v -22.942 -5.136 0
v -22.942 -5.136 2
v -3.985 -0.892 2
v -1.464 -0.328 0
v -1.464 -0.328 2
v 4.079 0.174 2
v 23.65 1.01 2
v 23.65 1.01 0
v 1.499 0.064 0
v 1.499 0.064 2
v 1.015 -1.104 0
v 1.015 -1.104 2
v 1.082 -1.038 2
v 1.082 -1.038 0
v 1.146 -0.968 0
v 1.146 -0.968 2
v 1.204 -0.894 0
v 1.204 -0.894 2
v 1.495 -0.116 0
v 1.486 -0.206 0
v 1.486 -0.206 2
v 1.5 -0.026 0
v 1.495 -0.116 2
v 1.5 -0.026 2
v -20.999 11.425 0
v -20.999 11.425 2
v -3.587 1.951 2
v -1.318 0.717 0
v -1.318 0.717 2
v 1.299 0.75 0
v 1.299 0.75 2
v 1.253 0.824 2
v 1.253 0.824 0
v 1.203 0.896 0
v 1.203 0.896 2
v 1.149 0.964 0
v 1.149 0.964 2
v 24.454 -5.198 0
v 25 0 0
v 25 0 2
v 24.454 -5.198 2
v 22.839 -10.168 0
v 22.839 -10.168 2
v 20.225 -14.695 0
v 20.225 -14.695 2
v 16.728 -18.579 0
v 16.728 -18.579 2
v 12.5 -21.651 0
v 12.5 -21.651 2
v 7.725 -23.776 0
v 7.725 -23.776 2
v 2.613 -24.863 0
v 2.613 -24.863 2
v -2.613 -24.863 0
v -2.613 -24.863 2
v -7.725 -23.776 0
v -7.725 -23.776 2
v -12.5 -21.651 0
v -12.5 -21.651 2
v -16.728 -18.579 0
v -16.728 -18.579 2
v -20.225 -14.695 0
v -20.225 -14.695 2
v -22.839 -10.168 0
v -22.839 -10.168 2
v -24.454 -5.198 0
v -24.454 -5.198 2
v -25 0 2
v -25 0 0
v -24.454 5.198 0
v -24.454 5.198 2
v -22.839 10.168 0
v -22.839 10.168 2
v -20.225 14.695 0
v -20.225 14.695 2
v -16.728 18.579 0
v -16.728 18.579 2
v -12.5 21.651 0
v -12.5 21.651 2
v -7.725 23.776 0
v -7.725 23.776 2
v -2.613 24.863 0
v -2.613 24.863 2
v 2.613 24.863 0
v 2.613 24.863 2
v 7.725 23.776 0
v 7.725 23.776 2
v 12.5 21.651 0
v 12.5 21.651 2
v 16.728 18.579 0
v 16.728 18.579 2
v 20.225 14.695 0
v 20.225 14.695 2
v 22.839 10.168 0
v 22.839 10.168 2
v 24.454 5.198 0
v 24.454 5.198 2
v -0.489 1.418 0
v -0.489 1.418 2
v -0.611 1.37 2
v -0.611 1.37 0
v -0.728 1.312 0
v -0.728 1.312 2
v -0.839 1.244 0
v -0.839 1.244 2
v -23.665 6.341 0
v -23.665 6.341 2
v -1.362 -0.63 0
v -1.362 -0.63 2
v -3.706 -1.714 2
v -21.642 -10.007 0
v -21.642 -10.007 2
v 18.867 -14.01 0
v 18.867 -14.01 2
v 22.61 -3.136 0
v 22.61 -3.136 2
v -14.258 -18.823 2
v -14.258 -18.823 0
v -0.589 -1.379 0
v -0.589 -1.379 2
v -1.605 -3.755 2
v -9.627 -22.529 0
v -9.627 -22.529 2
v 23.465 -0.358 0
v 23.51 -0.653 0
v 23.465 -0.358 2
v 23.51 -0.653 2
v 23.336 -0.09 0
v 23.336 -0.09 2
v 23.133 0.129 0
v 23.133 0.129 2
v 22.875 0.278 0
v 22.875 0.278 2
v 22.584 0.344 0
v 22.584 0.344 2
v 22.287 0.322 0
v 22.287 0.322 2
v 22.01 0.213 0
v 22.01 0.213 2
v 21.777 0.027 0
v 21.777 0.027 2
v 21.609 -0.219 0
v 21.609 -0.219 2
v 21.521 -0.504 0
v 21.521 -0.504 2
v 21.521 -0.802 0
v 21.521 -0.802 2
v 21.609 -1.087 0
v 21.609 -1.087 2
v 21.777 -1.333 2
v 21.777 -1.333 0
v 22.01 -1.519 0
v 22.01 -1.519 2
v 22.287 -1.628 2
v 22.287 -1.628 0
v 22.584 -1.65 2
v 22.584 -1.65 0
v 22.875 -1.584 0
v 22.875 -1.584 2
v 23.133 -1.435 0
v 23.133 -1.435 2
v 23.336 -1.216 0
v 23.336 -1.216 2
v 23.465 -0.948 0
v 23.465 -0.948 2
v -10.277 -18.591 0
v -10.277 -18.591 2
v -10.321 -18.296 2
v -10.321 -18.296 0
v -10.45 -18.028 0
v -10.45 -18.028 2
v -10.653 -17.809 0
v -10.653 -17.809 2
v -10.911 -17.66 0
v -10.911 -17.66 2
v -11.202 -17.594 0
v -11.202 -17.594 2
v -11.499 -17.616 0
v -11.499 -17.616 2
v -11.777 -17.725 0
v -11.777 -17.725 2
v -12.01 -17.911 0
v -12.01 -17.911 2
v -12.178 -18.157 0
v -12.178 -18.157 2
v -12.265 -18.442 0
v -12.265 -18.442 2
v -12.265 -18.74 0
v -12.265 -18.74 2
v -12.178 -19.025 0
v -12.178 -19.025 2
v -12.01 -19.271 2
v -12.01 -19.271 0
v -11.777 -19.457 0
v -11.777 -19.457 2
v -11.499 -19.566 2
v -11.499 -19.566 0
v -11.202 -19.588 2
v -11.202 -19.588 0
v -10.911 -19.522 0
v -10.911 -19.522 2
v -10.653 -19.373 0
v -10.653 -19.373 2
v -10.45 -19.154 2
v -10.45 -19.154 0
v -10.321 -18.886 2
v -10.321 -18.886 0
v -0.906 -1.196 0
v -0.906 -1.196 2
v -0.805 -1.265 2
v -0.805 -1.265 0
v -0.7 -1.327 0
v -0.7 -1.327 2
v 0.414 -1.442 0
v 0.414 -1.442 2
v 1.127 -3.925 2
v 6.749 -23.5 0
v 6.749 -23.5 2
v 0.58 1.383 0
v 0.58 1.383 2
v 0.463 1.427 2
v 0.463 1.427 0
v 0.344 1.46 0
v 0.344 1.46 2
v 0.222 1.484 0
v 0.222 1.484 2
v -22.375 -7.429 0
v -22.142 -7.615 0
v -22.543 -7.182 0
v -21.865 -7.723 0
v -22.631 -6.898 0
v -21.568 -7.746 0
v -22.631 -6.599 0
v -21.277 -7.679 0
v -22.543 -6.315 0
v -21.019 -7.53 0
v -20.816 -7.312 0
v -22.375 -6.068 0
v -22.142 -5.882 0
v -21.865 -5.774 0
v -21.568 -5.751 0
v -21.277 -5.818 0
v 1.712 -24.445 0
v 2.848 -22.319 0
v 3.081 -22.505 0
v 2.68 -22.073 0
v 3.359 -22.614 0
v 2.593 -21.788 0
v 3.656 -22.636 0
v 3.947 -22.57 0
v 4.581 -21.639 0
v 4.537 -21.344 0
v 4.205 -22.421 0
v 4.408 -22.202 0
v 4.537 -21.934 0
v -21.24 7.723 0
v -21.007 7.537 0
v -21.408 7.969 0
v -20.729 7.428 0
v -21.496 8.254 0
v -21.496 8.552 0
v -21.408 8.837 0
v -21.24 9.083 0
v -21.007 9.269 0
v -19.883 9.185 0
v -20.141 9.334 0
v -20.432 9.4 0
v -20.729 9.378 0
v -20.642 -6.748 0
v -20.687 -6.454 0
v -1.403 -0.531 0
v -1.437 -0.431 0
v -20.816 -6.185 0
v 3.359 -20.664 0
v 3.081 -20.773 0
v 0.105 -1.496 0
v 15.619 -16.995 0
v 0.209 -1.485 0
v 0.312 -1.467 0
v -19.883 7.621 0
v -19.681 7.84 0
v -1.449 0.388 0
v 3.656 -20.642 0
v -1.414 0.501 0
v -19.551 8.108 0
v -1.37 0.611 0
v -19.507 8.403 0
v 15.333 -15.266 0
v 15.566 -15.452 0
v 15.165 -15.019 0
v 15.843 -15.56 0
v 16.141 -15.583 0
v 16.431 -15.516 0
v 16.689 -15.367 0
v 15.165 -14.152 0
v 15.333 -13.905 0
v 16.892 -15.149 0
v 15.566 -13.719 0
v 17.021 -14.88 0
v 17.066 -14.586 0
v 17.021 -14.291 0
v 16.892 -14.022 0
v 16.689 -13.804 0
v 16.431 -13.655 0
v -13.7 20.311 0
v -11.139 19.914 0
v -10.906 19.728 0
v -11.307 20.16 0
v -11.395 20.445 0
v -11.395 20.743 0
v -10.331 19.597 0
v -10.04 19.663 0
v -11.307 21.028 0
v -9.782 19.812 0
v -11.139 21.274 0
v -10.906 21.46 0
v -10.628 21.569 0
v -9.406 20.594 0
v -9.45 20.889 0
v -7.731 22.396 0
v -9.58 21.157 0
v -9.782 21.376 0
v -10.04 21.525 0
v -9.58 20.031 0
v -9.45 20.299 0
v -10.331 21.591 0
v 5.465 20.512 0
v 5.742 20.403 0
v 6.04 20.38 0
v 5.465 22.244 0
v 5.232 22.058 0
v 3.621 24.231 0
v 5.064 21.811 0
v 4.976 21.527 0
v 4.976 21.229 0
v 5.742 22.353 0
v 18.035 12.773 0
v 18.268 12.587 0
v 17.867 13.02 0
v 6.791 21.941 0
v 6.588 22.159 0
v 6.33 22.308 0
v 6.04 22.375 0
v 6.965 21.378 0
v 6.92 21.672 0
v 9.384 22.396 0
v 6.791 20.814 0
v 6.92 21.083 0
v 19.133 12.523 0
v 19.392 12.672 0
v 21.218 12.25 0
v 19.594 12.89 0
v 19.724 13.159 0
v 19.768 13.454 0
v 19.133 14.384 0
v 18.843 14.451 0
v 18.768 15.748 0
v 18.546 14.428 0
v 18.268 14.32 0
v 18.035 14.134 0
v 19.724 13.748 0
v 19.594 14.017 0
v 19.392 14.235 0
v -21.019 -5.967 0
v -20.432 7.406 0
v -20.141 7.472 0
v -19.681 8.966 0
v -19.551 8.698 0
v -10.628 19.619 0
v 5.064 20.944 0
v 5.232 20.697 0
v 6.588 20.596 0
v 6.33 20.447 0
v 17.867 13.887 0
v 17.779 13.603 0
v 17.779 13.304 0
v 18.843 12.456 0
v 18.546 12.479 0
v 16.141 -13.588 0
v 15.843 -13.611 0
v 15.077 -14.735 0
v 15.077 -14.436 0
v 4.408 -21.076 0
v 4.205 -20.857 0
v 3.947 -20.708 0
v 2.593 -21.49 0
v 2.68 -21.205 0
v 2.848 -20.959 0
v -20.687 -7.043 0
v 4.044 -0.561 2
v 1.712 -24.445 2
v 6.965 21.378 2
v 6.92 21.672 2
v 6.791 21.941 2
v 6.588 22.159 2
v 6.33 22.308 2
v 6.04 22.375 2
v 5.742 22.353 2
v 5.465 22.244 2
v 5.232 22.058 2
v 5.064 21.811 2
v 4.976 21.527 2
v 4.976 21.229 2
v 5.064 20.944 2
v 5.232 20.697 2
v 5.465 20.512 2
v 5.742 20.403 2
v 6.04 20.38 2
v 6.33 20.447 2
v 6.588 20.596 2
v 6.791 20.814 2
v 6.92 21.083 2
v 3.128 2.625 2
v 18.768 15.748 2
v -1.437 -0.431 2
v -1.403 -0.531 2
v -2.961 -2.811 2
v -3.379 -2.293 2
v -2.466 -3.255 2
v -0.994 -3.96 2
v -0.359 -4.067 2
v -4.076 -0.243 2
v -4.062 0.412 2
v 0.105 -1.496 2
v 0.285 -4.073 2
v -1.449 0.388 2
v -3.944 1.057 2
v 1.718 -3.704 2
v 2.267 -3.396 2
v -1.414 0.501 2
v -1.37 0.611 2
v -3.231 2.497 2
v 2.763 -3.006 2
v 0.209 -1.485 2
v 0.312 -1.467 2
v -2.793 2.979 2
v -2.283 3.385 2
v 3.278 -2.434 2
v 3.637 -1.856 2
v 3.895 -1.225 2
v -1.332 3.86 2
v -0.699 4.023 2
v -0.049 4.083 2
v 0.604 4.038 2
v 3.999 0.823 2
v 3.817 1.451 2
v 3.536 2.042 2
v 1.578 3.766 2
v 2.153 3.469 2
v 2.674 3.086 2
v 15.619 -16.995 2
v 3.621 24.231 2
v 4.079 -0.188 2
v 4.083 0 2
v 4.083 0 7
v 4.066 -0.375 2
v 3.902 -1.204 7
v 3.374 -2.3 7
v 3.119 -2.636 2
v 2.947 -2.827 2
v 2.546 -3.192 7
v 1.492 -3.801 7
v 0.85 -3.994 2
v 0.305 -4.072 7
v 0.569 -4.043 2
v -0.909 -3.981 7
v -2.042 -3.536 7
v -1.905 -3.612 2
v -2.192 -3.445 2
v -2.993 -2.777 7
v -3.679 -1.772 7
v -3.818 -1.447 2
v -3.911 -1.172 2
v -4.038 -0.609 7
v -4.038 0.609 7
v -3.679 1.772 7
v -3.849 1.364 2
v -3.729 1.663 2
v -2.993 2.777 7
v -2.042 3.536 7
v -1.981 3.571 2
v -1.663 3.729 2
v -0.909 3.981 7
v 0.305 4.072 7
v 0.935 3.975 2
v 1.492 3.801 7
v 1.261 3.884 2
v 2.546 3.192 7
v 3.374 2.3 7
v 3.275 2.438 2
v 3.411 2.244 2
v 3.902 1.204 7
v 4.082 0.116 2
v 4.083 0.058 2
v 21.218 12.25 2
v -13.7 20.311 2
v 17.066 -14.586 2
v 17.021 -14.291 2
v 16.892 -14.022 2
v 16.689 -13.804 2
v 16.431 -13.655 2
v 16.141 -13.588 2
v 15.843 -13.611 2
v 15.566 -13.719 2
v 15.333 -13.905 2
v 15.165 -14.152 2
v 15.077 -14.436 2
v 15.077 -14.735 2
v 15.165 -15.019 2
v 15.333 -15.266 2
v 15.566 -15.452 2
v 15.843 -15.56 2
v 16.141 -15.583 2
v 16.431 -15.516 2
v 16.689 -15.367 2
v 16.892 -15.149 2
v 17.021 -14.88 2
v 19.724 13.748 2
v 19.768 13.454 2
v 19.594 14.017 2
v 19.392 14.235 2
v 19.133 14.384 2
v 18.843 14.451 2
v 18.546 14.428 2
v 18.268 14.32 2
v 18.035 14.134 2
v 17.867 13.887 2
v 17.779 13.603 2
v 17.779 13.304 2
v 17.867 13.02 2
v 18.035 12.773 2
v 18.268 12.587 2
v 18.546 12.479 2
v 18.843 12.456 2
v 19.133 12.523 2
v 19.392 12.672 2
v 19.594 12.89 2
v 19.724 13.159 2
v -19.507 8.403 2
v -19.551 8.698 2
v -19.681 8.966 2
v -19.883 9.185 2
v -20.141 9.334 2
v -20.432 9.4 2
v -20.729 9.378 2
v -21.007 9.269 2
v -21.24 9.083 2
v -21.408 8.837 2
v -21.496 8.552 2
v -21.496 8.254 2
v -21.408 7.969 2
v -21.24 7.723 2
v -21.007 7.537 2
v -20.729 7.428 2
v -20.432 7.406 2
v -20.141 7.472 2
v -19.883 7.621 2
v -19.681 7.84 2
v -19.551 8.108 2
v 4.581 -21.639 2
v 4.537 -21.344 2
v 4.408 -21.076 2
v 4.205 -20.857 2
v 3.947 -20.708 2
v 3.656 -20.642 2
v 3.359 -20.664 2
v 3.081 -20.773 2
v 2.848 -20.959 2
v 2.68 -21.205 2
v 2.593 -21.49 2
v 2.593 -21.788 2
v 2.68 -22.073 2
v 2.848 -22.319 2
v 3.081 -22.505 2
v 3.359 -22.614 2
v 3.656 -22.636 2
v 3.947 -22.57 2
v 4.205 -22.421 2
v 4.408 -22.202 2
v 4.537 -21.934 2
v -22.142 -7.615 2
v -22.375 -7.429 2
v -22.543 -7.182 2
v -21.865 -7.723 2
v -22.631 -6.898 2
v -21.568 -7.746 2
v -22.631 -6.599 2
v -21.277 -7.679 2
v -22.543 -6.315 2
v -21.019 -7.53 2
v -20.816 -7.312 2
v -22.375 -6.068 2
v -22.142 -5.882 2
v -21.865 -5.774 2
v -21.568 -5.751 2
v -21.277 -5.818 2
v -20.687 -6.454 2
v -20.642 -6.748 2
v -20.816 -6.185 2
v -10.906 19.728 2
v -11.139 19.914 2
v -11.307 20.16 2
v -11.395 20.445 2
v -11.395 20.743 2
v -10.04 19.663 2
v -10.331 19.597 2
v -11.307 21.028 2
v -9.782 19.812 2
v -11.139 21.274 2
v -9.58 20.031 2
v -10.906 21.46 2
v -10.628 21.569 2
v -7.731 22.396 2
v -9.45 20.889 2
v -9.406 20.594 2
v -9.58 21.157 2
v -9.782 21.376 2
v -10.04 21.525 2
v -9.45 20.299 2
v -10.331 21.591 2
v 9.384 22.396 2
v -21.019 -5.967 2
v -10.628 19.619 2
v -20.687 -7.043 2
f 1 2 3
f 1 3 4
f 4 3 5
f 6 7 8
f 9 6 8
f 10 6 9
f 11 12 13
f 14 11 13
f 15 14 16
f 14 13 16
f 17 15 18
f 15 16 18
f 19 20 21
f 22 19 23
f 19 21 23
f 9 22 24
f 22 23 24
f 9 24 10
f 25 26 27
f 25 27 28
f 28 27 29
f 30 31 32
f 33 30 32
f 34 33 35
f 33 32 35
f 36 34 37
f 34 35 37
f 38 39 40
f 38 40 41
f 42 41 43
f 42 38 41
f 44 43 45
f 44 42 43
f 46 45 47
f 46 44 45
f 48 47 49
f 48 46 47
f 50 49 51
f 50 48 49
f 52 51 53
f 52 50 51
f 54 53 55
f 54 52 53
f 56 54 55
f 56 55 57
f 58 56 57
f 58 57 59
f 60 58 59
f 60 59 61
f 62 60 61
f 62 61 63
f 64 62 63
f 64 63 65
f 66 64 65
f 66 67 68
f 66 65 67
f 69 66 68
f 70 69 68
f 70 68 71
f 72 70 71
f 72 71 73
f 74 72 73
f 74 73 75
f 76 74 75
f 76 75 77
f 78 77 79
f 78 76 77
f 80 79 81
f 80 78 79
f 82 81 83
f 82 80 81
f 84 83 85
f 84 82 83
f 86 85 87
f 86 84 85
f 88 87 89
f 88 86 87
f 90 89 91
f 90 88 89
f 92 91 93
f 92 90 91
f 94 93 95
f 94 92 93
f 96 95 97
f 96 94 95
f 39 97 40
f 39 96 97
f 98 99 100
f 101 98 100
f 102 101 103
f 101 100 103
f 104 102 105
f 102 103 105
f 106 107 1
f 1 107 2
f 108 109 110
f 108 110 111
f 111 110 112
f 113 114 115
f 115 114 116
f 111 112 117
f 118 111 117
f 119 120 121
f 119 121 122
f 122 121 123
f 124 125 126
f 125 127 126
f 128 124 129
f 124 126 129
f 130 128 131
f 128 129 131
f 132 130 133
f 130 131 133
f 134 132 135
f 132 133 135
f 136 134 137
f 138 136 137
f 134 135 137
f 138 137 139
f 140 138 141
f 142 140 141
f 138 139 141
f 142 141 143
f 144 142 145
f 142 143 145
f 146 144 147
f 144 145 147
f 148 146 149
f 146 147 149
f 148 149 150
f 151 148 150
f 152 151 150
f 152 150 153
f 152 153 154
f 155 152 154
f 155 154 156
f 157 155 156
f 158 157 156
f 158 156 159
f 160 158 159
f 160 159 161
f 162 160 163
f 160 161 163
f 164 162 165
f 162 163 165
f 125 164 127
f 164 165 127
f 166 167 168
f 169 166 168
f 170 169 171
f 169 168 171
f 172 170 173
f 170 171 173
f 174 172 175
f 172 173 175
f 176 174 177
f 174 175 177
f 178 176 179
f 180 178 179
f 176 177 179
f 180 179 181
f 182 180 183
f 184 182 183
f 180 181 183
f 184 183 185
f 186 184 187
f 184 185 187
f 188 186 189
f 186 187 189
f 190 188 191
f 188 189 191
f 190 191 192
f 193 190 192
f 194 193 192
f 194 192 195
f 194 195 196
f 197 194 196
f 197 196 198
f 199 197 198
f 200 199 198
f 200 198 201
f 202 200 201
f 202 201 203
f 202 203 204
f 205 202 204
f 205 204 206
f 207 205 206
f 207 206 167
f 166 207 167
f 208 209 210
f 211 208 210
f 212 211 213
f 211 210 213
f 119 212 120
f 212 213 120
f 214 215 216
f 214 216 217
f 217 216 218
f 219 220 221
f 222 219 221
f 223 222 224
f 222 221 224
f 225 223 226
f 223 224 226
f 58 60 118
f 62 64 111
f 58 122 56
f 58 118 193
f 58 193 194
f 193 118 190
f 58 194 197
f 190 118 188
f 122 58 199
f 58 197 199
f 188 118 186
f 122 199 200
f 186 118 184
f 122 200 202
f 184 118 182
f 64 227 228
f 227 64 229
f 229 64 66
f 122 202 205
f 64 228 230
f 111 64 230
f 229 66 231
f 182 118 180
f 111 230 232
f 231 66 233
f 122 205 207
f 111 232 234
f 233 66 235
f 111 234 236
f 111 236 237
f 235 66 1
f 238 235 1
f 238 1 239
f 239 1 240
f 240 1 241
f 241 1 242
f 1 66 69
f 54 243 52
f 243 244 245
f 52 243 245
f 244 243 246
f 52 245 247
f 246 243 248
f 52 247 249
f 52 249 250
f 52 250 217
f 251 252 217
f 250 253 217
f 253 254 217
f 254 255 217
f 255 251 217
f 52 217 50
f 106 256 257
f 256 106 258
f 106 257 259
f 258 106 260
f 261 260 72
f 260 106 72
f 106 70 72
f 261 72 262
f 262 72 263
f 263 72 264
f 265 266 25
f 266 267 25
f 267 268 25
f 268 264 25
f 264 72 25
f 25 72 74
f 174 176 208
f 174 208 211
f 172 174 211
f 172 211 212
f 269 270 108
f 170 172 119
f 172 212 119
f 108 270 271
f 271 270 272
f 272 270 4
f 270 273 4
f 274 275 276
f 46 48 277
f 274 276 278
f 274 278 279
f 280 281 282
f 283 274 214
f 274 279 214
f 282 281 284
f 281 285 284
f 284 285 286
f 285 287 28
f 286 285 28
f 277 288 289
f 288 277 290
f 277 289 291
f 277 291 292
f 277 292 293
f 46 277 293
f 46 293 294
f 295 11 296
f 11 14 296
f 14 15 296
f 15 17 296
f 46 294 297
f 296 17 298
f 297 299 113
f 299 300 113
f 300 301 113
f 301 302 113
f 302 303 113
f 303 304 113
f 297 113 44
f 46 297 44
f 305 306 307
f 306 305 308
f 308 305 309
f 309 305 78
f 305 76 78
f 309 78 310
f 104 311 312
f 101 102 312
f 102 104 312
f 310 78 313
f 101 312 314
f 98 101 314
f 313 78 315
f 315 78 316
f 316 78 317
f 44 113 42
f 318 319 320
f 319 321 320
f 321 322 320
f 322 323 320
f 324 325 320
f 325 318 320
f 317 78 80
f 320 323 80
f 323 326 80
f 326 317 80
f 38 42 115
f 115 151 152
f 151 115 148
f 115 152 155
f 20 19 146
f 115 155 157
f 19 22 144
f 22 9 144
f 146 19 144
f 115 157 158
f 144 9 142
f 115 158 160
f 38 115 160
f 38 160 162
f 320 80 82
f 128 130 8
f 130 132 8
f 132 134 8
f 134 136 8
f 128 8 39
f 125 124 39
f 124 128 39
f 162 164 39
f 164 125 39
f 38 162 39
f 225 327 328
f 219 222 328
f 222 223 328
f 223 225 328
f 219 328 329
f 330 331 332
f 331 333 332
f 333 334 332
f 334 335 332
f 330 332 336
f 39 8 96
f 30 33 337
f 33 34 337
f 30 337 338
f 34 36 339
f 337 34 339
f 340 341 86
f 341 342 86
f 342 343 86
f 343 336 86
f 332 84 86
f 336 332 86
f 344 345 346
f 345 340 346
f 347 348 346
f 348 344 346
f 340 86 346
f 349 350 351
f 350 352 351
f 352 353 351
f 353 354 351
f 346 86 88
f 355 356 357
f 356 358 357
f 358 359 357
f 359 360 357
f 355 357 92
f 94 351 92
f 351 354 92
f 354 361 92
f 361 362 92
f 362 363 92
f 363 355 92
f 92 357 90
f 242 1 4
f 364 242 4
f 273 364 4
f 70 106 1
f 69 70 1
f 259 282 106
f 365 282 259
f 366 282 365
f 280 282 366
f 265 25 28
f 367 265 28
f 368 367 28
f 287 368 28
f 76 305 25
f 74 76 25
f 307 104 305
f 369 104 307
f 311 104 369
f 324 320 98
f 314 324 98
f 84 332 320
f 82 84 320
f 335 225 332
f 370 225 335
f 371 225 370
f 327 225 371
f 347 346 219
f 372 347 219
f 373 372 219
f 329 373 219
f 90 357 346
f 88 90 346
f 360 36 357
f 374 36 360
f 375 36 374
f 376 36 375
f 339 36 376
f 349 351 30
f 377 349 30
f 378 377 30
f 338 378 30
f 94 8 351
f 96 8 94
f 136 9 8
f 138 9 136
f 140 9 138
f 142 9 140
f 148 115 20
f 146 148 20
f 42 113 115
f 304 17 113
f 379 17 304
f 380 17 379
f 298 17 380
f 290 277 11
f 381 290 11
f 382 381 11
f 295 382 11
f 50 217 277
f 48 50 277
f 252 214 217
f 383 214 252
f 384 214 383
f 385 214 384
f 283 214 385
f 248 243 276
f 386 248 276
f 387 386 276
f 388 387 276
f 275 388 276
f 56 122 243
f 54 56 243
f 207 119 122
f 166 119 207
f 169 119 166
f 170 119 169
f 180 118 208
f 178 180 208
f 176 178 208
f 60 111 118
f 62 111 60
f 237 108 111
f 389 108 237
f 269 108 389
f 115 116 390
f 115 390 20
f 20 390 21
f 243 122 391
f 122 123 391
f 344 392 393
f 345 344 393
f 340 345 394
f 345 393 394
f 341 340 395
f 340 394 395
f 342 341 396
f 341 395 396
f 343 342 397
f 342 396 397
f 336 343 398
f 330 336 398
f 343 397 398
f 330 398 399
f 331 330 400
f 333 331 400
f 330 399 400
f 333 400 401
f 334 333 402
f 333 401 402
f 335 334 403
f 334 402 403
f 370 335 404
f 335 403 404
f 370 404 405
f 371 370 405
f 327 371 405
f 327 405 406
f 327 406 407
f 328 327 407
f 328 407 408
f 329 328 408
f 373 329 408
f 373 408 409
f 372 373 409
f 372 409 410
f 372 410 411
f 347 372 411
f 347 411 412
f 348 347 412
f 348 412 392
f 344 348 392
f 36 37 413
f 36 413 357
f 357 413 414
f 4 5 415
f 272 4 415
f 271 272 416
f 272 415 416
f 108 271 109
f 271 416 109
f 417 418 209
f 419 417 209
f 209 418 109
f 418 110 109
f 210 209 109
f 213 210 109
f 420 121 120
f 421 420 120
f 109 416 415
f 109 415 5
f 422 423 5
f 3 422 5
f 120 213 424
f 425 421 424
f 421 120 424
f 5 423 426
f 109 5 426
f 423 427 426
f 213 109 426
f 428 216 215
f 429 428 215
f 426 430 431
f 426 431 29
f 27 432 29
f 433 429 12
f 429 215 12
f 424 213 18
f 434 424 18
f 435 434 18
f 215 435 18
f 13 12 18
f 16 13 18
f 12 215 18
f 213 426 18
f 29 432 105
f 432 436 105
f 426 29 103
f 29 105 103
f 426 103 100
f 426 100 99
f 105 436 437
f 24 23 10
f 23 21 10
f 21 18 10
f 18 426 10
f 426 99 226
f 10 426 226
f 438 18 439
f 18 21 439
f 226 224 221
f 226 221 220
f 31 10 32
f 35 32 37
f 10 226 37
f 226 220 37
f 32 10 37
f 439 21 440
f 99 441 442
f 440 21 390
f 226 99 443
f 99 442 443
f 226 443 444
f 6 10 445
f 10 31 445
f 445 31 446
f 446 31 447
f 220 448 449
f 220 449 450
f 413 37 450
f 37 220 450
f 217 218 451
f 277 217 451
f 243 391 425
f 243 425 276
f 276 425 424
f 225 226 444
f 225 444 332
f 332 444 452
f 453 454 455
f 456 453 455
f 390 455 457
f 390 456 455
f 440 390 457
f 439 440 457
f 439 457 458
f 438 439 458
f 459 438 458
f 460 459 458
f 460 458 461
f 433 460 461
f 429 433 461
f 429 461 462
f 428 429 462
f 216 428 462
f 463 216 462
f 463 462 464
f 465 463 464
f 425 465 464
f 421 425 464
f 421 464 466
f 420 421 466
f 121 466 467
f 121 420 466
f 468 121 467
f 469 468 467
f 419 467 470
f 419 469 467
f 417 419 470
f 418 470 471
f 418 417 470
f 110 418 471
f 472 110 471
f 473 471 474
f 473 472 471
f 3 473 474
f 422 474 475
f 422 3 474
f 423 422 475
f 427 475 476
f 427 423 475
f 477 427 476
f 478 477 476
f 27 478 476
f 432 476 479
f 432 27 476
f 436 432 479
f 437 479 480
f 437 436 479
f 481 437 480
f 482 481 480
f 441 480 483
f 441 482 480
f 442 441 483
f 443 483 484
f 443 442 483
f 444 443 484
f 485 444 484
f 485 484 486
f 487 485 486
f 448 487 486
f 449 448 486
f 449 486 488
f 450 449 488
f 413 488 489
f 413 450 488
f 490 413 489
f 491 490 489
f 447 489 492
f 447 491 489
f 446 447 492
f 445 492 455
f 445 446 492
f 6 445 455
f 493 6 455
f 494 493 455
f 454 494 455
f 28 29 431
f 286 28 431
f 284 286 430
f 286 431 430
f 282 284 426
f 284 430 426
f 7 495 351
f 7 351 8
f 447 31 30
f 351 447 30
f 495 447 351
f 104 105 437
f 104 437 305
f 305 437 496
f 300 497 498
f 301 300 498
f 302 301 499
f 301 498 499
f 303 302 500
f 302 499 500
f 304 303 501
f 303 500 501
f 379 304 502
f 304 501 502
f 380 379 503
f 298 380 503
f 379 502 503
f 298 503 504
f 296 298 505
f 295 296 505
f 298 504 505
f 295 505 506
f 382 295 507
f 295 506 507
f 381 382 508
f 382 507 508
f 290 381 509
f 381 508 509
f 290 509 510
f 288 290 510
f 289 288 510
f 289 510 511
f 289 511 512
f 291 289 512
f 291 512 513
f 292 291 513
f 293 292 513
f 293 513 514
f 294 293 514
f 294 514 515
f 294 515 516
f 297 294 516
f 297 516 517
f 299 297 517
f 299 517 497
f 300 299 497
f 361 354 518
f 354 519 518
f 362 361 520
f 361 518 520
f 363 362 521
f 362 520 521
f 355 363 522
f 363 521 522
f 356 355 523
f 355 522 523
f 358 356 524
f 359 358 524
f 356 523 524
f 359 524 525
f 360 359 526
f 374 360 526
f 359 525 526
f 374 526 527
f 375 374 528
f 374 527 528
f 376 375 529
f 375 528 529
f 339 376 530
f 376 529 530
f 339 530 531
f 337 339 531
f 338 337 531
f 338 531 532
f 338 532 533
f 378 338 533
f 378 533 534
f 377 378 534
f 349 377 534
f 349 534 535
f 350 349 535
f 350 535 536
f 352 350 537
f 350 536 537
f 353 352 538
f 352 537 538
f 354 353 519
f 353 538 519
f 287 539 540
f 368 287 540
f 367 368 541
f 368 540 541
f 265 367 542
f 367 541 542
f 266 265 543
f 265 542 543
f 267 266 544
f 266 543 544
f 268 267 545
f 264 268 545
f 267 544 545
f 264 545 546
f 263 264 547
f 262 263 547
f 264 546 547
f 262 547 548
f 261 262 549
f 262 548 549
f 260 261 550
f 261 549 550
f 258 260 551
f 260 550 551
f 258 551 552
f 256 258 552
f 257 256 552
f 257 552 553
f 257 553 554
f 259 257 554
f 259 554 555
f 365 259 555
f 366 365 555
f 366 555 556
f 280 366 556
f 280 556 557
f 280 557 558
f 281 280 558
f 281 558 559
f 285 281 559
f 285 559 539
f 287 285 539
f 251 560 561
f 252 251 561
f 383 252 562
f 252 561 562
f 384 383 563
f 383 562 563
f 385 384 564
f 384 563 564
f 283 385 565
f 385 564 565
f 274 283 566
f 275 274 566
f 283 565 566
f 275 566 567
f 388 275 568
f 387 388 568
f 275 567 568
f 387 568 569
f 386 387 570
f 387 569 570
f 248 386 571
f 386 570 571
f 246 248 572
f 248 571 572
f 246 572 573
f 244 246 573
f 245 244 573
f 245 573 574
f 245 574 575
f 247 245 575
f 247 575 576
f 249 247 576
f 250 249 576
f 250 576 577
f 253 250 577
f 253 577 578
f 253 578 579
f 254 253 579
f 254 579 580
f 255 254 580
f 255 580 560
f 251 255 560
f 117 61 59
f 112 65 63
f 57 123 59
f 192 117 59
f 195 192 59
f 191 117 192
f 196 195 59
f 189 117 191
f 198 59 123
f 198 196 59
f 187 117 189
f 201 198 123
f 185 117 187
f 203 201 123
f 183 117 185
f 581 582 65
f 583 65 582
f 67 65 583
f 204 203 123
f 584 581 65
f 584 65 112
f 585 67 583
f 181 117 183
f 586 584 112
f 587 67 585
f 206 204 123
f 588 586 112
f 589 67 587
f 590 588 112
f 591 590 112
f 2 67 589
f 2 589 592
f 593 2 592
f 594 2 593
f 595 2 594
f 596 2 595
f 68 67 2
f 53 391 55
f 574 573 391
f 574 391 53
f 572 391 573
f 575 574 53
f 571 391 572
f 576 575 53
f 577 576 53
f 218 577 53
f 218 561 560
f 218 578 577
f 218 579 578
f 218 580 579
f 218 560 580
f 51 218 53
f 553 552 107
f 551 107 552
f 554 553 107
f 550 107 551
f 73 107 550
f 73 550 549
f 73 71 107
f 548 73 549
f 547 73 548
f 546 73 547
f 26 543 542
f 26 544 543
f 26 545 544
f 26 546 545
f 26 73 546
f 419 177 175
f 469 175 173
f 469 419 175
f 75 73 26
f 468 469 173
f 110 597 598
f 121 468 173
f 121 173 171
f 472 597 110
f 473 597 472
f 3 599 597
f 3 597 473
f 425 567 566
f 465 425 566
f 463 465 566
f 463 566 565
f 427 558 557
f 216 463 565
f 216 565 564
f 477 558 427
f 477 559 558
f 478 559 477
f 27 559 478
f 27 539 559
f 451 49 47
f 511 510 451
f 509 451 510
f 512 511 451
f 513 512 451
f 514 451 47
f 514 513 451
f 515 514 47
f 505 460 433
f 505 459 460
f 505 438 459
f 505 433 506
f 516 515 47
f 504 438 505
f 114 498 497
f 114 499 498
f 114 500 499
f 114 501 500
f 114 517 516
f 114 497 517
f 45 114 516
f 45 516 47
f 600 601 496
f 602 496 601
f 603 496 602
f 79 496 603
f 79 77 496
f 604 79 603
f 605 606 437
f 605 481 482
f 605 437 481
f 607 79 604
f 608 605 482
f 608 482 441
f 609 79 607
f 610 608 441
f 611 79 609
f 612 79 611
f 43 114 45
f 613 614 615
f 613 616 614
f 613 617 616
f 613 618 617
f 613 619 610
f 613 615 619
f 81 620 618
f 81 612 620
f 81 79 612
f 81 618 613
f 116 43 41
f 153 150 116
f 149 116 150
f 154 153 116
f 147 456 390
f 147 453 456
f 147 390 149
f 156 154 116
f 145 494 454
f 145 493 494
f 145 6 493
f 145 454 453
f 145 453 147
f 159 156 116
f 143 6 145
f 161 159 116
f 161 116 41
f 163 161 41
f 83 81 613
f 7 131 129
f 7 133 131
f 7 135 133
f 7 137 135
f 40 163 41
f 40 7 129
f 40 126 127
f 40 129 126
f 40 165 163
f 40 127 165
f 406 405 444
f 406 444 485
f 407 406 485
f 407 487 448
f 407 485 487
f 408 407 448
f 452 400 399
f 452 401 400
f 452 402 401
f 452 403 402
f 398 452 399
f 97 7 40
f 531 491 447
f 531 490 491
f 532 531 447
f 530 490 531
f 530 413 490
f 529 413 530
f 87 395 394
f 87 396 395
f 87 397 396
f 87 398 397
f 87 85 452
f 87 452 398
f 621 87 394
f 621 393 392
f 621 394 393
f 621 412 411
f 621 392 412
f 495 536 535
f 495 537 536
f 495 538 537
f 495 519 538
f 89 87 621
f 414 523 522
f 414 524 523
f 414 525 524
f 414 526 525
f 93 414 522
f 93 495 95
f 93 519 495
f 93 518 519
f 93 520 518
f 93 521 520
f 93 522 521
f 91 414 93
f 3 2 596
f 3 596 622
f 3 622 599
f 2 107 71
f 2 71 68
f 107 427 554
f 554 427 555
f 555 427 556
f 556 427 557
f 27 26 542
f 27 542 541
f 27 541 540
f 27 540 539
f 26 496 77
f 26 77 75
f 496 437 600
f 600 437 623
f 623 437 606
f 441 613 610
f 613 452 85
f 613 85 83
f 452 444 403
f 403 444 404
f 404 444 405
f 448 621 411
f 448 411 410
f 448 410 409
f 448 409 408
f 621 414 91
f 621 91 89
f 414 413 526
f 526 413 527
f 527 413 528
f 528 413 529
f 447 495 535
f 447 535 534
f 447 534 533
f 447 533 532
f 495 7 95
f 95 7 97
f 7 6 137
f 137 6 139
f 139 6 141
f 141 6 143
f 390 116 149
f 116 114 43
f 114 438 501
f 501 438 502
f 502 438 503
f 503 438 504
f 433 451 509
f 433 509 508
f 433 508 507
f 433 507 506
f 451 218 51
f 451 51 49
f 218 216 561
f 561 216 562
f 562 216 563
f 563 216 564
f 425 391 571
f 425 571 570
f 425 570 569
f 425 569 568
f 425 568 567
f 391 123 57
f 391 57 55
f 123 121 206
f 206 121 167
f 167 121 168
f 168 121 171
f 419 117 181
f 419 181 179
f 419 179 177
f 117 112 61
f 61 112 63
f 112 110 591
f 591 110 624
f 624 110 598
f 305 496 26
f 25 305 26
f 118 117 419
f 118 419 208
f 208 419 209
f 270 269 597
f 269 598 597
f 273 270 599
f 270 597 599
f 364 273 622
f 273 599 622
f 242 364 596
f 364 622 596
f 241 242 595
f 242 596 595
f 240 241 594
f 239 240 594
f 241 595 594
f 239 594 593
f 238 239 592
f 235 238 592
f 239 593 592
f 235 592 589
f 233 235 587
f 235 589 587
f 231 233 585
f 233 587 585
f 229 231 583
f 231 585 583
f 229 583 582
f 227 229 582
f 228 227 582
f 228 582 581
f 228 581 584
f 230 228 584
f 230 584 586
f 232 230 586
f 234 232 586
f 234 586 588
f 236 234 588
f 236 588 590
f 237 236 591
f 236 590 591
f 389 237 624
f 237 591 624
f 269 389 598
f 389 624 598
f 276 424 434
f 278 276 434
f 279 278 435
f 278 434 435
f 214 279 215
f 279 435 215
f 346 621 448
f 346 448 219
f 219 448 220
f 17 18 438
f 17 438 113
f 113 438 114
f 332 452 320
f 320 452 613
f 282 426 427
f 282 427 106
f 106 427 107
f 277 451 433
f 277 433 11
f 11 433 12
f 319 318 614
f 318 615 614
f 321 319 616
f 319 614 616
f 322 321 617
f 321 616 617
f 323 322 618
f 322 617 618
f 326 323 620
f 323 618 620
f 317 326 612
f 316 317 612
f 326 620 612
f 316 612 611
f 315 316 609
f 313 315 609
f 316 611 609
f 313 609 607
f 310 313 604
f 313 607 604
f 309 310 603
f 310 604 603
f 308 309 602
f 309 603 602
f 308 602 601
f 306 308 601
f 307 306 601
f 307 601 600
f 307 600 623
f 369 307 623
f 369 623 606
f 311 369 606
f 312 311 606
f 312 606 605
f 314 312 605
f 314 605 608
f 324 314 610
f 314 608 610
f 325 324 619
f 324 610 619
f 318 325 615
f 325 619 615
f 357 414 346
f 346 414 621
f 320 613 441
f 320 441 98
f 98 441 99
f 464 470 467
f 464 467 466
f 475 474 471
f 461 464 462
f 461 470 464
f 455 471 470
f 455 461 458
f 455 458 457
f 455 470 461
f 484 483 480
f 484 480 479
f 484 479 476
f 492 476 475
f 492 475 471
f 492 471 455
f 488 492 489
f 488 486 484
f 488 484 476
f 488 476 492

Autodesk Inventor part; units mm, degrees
ref_plane "YZ Plane" through (0, 0, 0) normal (1, 0, 0) x (0, 1, 0)
ref_plane "XZ Plane" through (0, 0, 0) normal (0, 1, 0) x (-1, 0, 0)
ref_plane "XY Plane" through (0, 0, 0) normal (0, 0, 1) x (1, 0, 0)
sketch "Sketch1" plane through (0, 0, 0) normal (0, 0, 1) x (1, 0, 0)
  circle A0 centre (0, 0) radius 25
  dimension "d0" = 50
extrude "Extrusion1" add sketch "Sketch1" along normal blind 2
sketch "Sketch2" plane through (0, 0, 2) normal (0, 0, 1) x (1, 0, 0)
  line L0 (0, 0) -> (21.2176, 12.25)
  line L1 (0, 0) -> (24.5, 0) construction
  line L2 (21.2176, 12.25) -> (23.6504, 1.0103)
  circle A0 centre (0, 0) radius 25 projected
  line L3 (23.6504, 1.0103) -> (0, 0)
  dimension "d3" = 24.5
  dimension "d4" = 30
  dimension "d5" = 11.5
extrude "Extrusion2" cut sketch "Sketch2" against normal blind 2 contours L0 L2 L3
sketch "Sketch3" plane through (0, 0, 2) normal (0, 0, 1) x (1, 0, 0)
  point P0 (0, 0)
sketch "Sketch4" plane through (0, 0, 2) normal (0, 0, 1) x (1, 0, 0)
  line L0 (0, 0) -> (23.6504, 1.0103) projected
  line L1 (0, 0) -> (18.7681, 15.7483)
  line L2 (0, 0) -> (24.5, 0) construction
  line L3 (18.7681, 15.7483) -> (9.384, 22.3958)
  line L4 (9.384, 22.3958) -> (0, 0)
  dimension "d8" = 24.5
  dimension "d9" = 40
  dimension "d10" = 11.5
extrude "Extrusion3" cut sketch "Sketch4" against normal blind 2
sketch "Sketch5" plane through (0, 0, 2) normal (0, 0, 1) x (1, 0, 0)
  line L0 (23.6504, 1.0103) -> (0, 0) projected
  line L1 (0, 0) -> (3.6213, 24.2309)
  line L2 (0, 0) -> (24.5, 0) construction
  line L3 (3.6213, 24.2309) -> (-7.7313, 22.3958)
  line L4 (9.384, 22.3958) -> (0, 0) projected
  line L5 (-7.7313, 22.3958) -> (0, 0)
  dimension "d13" = 24.5
  dimension "d14" = 81.5
  dimension "d15" = 11.5
extrude "Extrusion4" cut sketch "Sketch5" against normal blind 2
sketch "Sketch6" plane through (0, 0, 2) normal (0, 0, 1) x (1, 0, 0)
  line L0 (0, 0) -> (-13.7002, 20.3114)
  line L1 (0, 0) -> (24.5, 0) construction
  line L2 (-13.7002, 20.3114) -> (-20.9994, 11.4248)
  circle A0 centre (0, 0) radius 25 projected
  line L3 (-20.9994, 11.4248) -> (0, 0)
  dimension "d18" = 24.5
  dimension "d19" = 124
  dimension "d20" = 11.5
extrude "Extrusion5" cut sketch "Sketch6" against normal blind 2 contours L3 L2 L0
sketch "Sketch7" plane through (0, 0, 2) normal (0, 0, 1) x (1, 0, 0)
  line L0 (23.6504, 1.0103) -> (0, 0) projected
  line L1 (0, 0) -> (-23.6652, 6.3411)
  line L2 (0, 0) -> (24.5, 0) construction
  line L3 (-23.6652, 6.3411) -> (-22.9423, -5.1362)
  circle A0 centre (0, 0) radius 25 projected
  line L4 (-22.9423, -5.1362) -> (0, 0)
  dimension "d23" = 24.5
  dimension "d24" = 165
  dimension "d25" = 11.5
extrude "Extrusion6" cut sketch "Sketch7" against normal blind 2 contours L4 L3 L1
sketch "Sketch8" plane through (0, 0, 2) normal (0, 0, 1) x (1, 0, 0)
  line L0 (0, 0) -> (-21.6423, -10.0067)
  line L1 (-21.6423, -10.0067) -> (-14.2585, -18.8231)
  line L2 (-14.2585, -18.8231) -> (0, 0)
  dimension "d28" = 11.5
extrude "Extrusion7" cut sketch "Sketch8" against normal blind 2
sketch "Sketch9" plane through (0, 0, 2) normal (0, 0, 1) x (1, 0, 0)
  line L0 (0, 0) -> (-21.6423, -10.0067) projected
  line L1 (0, 0) -> (-9.6274, -22.5292)
  line L2 (-9.6274, -22.5292) -> (1.7119, -24.4448)
  line L3 (1.7119, -24.4448) -> (0, 0)
  dimension "d31" = 24.5
  dimension "d32" = 11.5
extrude "Extrusion8" cut sketch "Sketch9" against normal blind 2
sketch "Sketch10" plane through (0, 0, 2) normal (0, 0, 1) x (1, 0, 0)
  line L0 (0, 0) -> (6.7487, -23.5)
  line L1 (6.7487, -23.5) -> (15.6191, -16.995)
  line L2 (15.6191, -16.995) -> (0, 0)
  dimension "d35" = 11
  dimension "d36" = 23.5
extrude "Extrusion9" cut sketch "Sketch10" against normal blind 2
sketch "Sketch11" plane through (0, 0, 2) normal (0, 0, 1) x (1, 0, 0)
  line L0 (0, 0) -> (-22.9423, -5.1362) projected
  line L1 (0, 0) -> (18.8673, -14.0098)
  line L2 (18.8673, -14.0098) -> (22.6101, -3.1358)
  line L3 (0, 0) -> (23.6504, 1.0103) projected
  line L4 (22.6101, -3.1358) -> (0, 0)
  dimension "d39" = 23.5
  dimension "d40" = 11.5
extrude "Extrusion10" cut sketch "Sketch11" against normal blind 2
sketch "Sketch12" plane through (0, 0, 2) normal (0, 0, 1) x (1, 0, 0)
  line L0 (-21.6423, -10.0067) -> (0, 0) projected
  circle A0 centre (0, 0) radius 1.5
  dimension "d43" = 3
extrude "Extrusion11" cut sketch "Sketch12" against normal blind 2
sketch "Sketch13" plane through (0, 0, 2) normal (0, 0, 1) x (1, 0, 0)
  circle A0 centre (-10.4058, 20.5939) radius 1
  point P0 (0, 0)
  dimension "d46" = 2
extrude "Extrusion12" cut sketch "Sketch13" against normal blind 2
sketch "Sketch14" plane through (0, 0, 2) normal (0, 0, 1) x (1, 0, 0)
  circle A0 centre (5.9648, 21.3776) radius 1
  point P0 (0, 0)
  dimension "d49" = 2
extrude "Extrusion13" cut sketch "Sketch14" against normal blind 2
sketch "Sketch15" plane through (0, 0, 2) normal (0, 0, 1) x (1, 0, 0)
  circle A0 centre (18.7681, 13.4535) radius 1
  point P0 (0, 0)
  dimension "d52" = 2
extrude "Extrusion14" cut sketch "Sketch15" against normal blind 2
sketch "Sketch16" plane through (0, 0, 2) normal (0, 0, 1) x (1, 0, 0)
  circle A0 centre (22.5096, -0.6531) radius 1
  point P0 (0, 0)
  dimension "d55" = 2
extrude "Extrusion15" cut sketch "Sketch16" against normal blind 2
sketch "Sketch17" plane through (0, 0, 2) normal (0, 0, 1) x (1, 0, 0)
  circle A0 centre (16.0659, -14.5855) radius 1
  point P0 (0, 0)
  dimension "d58" = 2
extrude "Extrusion16" cut sketch "Sketch17" against normal blind 2
sketch "Sketch18" plane through (0, 0, 2) normal (0, 0, 1) x (1, 0, 0)
  circle A0 centre (3.5814, -21.6389) radius 1
  point P0 (0, 0)
  dimension "d61" = 2
extrude "Extrusion17" cut sketch "Sketch18" against normal blind 2
sketch "Sketch19" plane through (0, 0, 2) normal (0, 0, 1) x (1, 0, 0)
  circle A0 centre (-11.2766, -18.5911) radius 1
  point P0 (0, 0)
  dimension "d64" = 2
extrude "Extrusion18" cut sketch "Sketch19" against normal blind 2
sketch "Sketch20" plane through (0, 0, 2) normal (0, 0, 1) x (1, 0, 0)
  circle A0 centre (-21.6423, -6.7485) radius 1
  point P0 (0, 0)
  dimension "d67" = 2
extrude "Extrusion19" cut sketch "Sketch20" against normal blind 2
sketch "Sketch21" plane through (0, 0, 2) normal (0, 0, 1) x (1, 0, 0)
  circle A0 centre (-20.5068, 8.403) radius 1
  point P0 (0, 0)
  dimension "d70" = 2
extrude "Extrusion20" cut sketch "Sketch21" against normal blind 2
sketch "Sketch22" plane through (0, 0, 2) normal (0, 0, 1) x (1, 0, 0)
  circle A0 centre (0, 0) radius 4.0832
extrude "Extrusion21" add sketch "Sketch22" along normal blind 5
properties part number "F 3"
